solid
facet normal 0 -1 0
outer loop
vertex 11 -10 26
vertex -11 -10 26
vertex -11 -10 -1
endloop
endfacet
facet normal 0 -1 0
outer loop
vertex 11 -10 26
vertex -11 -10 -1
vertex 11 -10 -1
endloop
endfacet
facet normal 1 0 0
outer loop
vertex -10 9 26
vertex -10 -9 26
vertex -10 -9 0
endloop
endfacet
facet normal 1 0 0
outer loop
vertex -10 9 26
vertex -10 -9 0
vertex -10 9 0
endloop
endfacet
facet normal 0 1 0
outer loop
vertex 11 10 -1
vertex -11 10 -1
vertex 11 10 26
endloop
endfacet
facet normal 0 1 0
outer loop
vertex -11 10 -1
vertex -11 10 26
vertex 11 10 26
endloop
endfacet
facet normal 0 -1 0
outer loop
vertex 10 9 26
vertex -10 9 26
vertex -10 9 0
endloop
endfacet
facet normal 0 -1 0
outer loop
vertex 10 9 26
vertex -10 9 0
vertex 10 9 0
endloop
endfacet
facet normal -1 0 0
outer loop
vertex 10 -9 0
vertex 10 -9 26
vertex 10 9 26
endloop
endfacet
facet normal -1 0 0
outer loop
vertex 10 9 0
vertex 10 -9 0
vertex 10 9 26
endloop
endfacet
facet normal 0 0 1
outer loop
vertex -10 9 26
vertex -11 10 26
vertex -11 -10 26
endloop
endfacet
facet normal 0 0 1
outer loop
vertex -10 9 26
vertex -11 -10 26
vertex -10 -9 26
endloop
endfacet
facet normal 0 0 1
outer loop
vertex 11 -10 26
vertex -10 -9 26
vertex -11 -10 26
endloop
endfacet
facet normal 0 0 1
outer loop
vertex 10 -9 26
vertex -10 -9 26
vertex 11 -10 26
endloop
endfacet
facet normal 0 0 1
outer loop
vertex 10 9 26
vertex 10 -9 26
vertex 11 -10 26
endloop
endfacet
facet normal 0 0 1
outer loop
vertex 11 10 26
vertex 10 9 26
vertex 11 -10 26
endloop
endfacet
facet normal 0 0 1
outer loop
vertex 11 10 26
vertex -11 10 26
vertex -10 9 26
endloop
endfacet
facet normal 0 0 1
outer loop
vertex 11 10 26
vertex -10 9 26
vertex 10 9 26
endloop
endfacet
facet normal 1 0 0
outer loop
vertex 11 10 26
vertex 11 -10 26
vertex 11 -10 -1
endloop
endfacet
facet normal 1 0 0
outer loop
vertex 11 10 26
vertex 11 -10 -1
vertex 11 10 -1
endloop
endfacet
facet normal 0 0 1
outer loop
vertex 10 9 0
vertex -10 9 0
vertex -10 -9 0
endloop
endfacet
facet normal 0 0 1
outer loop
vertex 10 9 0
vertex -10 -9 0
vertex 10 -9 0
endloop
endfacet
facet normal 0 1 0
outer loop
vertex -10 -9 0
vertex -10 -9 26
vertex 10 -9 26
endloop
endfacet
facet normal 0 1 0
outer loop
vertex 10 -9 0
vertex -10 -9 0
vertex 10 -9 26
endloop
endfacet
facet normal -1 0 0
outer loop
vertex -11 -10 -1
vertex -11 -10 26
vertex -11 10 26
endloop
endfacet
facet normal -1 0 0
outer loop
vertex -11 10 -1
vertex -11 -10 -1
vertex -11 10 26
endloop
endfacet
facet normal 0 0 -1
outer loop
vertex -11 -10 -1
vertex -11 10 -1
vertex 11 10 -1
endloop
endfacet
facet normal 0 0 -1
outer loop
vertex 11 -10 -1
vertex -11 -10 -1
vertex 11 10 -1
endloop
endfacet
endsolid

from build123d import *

# Parameters (mm, degrees)
SKETCH2_W           = 22
SKETCH2_H           = 20
SKETCH2_W_2         = 20
SKETCH2_H_2         = 18
BOSS_EXTRUDE1_DEPTH = 10
SKETCH2_2_W         = 20
SKETCH2_2_H         = 18
BOSS_EXTRUDE2_DEPTH = 1
SKETCH2_3_W         = 22
SKETCH2_3_H         = 20
SKETCH2_3_W_2       = 20
SKETCH2_3_H_2       = 18
BOSS_EXTRUDE3_DEPTH = 1
SKETCH2_4_W         = 22
SKETCH2_4_H         = 20
SKETCH2_4_W_2       = 20
SKETCH2_4_H_2       = 18
BOSS_EXTRUDE4_DEPTH = 26


with BuildPart() as part:
    # Sketch2 → Boss-Extrude1 (new body)
    with BuildSketch(Plane.XY):
        Rectangle(SKETCH2_W, SKETCH2_H)
        Rectangle(SKETCH2_W_2, SKETCH2_H_2, mode=Mode.SUBTRACT)
    extrude(amount=BOSS_EXTRUDE1_DEPTH)



with BuildPart() as body_2:
    # Sketch2<2> → Boss-Extrude2 (new body)
    with BuildSketch(Plane.XY):
        Rectangle(SKETCH2_2_W, SKETCH2_2_H)
    extrude(amount=-BOSS_EXTRUDE2_DEPTH)


with BuildPart() as part_1:
    add(part.part)

    add(body_2.part)  # Boss-Extrude3 merges body 2
    # Sketch2<3> → Boss-Extrude3 (add)
    with BuildSketch(Plane.XY):
        Rectangle(SKETCH2_3_W, SKETCH2_3_H)
        Rectangle(SKETCH2_3_W_2, SKETCH2_3_H_2, mode=Mode.SUBTRACT)
    extrude(amount=-BOSS_EXTRUDE3_DEPTH)

    # Sketch2<4> → Boss-Extrude4 (add)
    with BuildSketch(Plane.XY):
        Rectangle(SKETCH2_4_W, SKETCH2_4_H)
        Rectangle(SKETCH2_4_W_2, SKETCH2_4_H_2, mode=Mode.SUBTRACT)
    extrude(amount=BOSS_EXTRUDE4_DEPTH)


solid = part_1.part
